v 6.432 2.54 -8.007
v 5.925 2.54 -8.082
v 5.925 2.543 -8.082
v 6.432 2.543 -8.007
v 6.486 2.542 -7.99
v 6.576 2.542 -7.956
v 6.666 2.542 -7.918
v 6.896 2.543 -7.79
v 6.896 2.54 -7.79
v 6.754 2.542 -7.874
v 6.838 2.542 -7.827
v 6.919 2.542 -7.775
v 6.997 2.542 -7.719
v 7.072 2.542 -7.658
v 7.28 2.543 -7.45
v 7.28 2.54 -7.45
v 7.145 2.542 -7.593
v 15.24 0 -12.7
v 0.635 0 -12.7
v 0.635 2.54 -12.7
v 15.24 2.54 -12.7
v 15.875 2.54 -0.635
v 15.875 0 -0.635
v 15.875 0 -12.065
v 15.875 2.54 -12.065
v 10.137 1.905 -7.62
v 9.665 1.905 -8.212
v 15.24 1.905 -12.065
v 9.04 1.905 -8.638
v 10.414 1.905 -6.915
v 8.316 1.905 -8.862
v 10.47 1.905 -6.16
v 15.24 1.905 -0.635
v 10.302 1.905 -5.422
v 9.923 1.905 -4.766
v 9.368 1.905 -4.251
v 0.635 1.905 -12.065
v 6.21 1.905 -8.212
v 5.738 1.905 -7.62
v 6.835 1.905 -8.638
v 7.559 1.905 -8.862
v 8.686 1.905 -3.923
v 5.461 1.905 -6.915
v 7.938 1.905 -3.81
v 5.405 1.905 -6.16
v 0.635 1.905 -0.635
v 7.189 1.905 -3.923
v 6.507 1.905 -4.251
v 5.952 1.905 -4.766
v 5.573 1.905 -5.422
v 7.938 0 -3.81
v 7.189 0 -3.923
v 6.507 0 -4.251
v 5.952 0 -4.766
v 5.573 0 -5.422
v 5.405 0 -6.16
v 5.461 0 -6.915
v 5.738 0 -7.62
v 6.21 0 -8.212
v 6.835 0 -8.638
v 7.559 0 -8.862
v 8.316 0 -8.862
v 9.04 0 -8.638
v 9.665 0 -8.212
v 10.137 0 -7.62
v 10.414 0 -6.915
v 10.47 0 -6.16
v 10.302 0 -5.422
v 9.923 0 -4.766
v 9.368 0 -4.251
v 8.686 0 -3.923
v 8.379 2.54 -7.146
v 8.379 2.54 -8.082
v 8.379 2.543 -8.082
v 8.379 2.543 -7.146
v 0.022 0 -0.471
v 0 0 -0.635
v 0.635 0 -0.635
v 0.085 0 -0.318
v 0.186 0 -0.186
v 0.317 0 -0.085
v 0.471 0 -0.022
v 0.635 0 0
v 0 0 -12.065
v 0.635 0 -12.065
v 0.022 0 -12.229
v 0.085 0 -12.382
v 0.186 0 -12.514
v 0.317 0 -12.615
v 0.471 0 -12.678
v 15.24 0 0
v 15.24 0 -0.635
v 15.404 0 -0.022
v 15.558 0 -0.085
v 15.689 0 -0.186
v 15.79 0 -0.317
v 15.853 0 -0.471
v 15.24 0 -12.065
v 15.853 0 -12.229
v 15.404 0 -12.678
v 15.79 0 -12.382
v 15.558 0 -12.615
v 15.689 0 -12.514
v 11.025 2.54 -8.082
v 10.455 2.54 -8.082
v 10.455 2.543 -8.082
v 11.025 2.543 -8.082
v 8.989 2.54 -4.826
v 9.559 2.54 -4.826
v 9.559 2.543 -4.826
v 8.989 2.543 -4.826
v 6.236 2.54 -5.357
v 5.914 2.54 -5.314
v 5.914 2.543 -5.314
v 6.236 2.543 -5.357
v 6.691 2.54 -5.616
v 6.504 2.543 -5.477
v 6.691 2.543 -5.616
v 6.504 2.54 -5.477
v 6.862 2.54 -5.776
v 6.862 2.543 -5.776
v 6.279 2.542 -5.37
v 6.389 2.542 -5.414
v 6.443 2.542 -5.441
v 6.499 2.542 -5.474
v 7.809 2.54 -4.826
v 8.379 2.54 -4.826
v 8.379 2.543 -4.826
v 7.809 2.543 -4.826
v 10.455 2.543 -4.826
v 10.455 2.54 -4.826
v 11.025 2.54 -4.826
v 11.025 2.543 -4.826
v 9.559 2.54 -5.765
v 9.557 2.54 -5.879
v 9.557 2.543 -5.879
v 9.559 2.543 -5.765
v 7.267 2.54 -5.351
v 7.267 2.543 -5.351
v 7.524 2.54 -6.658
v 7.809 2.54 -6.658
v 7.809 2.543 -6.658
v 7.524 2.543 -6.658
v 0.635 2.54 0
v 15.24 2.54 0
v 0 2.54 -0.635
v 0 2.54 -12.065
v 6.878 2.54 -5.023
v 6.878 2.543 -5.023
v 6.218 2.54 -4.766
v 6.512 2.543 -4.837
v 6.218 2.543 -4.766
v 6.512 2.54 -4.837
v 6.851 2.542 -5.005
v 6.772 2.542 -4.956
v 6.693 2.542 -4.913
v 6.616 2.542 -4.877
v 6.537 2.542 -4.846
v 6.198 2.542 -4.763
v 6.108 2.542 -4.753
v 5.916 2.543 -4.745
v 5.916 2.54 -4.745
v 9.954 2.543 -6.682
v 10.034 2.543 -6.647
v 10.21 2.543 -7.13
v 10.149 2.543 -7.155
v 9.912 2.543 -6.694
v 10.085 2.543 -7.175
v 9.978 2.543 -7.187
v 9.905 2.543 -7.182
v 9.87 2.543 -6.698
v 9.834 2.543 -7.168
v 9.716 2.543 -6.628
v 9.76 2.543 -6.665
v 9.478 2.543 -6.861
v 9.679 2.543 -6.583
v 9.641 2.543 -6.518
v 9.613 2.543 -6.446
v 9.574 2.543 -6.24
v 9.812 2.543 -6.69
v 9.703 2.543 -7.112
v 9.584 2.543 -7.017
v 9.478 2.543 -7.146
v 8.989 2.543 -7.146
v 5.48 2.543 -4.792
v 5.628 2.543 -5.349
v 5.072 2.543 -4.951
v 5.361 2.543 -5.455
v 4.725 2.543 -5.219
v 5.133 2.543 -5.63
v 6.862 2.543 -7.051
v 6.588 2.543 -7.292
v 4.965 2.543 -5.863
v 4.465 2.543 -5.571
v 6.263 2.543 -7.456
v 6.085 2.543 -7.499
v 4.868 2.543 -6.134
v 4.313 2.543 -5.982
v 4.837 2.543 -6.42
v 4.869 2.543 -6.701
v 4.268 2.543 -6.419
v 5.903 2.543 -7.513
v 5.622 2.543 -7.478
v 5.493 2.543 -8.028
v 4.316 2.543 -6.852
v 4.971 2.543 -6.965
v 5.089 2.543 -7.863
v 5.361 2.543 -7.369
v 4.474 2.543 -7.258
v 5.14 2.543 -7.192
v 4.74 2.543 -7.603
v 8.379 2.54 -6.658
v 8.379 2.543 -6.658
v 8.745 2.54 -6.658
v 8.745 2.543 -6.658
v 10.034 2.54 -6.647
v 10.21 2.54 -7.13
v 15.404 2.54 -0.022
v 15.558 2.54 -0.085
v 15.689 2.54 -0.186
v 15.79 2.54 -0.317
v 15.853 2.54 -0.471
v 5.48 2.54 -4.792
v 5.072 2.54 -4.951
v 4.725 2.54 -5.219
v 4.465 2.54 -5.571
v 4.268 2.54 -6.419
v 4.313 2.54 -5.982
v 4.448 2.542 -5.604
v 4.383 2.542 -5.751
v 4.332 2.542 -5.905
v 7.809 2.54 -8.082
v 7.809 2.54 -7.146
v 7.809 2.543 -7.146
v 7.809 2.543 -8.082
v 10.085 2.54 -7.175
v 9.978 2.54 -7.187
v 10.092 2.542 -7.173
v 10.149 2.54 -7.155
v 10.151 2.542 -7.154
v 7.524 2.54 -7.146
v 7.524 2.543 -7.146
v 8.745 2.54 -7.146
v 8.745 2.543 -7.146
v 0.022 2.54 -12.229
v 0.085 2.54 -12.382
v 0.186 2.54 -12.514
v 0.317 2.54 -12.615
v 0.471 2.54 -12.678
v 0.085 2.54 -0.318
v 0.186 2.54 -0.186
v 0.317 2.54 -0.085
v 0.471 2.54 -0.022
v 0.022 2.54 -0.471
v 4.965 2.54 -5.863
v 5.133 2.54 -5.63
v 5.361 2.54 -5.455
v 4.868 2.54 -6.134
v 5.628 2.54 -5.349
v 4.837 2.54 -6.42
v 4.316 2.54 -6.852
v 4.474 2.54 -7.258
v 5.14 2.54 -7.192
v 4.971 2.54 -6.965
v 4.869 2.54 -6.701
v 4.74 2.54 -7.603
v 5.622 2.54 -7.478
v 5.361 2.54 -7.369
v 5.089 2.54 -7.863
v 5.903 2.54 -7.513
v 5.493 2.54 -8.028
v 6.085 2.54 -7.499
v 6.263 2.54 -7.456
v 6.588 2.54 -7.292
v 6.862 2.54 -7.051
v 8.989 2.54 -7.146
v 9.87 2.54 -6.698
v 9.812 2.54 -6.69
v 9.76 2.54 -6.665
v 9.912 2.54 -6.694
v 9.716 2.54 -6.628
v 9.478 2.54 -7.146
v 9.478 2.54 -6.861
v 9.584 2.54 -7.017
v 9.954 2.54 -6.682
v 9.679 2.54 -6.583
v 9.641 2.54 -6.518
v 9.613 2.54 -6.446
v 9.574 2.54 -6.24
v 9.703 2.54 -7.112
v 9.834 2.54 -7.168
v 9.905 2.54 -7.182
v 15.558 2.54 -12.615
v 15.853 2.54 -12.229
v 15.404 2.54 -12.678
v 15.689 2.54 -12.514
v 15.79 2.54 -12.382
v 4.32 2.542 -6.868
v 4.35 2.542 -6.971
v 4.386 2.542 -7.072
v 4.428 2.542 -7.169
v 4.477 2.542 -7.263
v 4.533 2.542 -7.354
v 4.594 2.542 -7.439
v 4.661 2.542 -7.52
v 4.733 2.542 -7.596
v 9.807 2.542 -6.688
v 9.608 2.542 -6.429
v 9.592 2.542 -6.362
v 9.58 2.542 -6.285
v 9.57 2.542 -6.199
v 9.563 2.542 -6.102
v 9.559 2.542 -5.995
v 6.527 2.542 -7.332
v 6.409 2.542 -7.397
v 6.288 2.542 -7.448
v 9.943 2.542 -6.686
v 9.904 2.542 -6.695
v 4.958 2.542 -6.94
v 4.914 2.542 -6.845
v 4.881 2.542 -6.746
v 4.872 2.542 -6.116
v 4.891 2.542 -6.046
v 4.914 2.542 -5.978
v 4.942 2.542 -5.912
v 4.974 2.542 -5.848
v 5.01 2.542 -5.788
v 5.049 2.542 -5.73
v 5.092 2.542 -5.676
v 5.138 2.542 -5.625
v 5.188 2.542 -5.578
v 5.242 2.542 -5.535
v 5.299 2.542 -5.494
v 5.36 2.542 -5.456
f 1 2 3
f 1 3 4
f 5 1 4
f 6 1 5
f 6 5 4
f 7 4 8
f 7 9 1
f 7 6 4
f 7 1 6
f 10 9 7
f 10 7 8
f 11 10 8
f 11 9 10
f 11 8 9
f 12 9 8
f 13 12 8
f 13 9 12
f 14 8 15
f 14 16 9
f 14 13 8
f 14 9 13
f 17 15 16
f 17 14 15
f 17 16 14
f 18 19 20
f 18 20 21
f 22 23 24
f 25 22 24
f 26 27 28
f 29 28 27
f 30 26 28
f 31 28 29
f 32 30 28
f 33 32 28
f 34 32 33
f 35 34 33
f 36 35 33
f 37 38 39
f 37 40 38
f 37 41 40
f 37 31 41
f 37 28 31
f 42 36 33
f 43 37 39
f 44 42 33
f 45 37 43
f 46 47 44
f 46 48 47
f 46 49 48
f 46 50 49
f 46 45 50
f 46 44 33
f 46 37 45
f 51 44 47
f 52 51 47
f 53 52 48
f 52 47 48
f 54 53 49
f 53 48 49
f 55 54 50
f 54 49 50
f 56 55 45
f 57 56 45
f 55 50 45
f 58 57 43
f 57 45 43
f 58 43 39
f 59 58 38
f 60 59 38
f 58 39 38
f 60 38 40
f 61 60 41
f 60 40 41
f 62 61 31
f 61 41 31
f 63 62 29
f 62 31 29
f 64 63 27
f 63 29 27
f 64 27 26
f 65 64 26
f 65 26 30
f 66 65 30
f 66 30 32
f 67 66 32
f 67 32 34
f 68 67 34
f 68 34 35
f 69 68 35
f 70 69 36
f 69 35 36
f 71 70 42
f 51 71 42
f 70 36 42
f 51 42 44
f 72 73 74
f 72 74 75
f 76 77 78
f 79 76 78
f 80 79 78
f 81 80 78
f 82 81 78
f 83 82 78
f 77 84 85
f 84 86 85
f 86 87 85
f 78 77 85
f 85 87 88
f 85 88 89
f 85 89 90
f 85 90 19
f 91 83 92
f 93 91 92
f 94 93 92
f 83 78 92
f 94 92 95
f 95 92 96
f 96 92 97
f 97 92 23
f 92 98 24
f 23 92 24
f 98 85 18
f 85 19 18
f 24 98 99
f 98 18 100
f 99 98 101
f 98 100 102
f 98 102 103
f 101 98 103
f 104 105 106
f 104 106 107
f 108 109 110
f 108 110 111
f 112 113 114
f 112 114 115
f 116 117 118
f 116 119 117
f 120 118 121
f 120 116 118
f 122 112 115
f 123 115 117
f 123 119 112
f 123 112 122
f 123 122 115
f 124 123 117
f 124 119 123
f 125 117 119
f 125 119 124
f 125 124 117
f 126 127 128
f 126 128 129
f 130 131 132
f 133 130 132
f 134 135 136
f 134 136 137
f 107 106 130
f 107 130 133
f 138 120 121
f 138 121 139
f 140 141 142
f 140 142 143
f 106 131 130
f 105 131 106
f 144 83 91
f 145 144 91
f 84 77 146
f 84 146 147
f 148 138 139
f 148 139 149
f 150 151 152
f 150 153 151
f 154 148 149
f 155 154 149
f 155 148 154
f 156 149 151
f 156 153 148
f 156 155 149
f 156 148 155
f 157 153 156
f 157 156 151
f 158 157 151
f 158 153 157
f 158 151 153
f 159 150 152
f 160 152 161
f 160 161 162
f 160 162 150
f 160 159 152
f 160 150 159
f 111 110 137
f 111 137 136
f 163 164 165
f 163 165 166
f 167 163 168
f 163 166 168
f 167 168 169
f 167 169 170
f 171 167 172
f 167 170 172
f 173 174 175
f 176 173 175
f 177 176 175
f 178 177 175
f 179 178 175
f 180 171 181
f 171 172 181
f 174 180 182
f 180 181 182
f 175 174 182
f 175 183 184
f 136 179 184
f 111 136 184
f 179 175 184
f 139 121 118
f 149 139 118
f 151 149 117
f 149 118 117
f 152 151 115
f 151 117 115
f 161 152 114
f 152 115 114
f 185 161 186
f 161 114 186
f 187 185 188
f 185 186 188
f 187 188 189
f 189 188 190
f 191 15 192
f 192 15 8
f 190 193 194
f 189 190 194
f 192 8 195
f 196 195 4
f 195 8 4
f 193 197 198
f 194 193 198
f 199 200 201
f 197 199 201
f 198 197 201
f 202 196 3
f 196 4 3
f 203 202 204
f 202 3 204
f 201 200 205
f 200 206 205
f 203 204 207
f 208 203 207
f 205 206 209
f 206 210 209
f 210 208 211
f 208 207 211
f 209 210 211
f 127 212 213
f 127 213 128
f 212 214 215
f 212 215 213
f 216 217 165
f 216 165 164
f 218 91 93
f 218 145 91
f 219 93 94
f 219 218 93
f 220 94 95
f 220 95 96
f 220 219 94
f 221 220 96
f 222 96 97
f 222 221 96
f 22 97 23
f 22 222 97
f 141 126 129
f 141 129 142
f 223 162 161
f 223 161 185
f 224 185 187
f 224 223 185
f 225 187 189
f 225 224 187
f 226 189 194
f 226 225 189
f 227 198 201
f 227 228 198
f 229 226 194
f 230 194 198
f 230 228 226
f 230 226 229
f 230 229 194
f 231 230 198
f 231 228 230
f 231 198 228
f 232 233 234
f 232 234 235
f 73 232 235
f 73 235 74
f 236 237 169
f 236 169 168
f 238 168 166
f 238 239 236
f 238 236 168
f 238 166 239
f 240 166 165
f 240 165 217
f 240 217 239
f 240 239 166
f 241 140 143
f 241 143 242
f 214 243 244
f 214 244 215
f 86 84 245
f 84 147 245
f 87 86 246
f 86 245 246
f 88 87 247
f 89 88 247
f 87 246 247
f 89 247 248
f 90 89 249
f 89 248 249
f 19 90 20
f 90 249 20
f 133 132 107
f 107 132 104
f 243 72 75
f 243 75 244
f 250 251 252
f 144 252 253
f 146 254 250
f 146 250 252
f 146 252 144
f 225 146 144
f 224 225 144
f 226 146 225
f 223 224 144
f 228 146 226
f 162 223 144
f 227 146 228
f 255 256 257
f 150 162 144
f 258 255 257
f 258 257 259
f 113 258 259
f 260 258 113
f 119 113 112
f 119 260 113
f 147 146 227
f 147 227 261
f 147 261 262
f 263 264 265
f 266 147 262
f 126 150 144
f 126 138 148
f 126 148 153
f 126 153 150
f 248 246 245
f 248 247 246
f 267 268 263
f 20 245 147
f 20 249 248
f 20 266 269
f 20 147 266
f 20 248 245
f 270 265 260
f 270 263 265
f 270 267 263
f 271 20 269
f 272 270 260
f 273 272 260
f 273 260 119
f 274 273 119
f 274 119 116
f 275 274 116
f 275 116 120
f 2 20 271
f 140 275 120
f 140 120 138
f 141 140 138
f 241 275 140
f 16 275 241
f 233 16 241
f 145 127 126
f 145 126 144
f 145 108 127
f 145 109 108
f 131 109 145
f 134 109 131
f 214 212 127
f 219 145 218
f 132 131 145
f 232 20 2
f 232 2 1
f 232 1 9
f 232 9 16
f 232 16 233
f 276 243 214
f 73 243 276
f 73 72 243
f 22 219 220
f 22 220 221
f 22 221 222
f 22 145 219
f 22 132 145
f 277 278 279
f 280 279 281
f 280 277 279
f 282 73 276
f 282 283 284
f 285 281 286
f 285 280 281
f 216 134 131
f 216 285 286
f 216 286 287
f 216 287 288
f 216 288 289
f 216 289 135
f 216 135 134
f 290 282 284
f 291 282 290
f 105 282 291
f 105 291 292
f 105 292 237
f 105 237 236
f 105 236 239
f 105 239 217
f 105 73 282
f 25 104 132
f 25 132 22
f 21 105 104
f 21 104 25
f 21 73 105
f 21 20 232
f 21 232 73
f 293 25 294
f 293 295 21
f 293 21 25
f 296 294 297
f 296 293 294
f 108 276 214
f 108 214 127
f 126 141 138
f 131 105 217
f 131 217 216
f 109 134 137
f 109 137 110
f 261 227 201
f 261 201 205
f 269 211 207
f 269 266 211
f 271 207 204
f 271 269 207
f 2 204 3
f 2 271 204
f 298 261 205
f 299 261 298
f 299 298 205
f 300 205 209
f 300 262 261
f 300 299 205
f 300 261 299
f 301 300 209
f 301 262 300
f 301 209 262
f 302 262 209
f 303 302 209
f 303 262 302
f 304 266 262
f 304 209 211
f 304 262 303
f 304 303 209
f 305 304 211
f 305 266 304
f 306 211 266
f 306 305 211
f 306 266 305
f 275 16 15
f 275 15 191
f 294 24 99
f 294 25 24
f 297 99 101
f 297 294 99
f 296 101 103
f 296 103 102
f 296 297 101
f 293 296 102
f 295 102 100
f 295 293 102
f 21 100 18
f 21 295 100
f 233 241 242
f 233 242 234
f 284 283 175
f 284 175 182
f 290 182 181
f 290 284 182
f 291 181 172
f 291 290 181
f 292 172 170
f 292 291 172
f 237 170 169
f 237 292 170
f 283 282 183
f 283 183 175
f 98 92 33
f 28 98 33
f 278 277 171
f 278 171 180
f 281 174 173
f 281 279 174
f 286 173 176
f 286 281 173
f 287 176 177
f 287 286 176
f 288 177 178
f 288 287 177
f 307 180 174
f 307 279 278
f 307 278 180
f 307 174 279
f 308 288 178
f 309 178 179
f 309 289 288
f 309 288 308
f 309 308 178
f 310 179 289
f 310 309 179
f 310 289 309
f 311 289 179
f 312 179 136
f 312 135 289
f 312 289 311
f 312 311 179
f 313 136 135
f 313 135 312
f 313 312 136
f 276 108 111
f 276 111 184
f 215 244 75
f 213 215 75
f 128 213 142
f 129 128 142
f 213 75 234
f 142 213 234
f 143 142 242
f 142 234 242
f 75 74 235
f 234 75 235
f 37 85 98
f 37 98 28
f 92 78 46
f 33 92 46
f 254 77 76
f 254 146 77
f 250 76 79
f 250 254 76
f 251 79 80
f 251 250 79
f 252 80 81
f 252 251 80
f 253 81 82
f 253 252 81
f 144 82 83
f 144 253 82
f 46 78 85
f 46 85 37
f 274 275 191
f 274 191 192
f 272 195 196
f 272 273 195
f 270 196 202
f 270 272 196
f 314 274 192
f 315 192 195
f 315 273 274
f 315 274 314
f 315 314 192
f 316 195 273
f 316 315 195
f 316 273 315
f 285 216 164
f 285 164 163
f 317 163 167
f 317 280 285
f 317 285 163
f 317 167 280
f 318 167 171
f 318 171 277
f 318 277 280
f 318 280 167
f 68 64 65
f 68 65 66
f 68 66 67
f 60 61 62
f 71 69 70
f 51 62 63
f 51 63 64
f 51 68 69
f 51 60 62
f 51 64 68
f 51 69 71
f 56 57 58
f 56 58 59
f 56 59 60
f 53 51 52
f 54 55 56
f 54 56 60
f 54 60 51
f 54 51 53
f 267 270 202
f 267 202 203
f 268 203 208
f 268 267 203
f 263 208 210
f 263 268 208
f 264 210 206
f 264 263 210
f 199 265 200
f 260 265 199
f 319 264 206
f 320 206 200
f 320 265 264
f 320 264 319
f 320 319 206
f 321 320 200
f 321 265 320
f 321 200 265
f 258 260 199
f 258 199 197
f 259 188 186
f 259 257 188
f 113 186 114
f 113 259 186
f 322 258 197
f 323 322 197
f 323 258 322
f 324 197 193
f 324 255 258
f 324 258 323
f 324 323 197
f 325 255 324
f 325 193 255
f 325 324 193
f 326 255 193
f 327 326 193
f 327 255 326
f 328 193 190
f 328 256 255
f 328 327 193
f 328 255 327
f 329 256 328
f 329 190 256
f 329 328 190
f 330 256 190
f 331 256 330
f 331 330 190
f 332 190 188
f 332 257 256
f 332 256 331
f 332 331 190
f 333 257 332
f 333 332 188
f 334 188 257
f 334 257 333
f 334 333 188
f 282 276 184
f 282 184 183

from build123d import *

# Parameters (mm, degrees)
SKETCH1_W           = 15.875
SKETCH1_H           = 12.7
BOSS_EXTRUDE1_DEPTH = 2.54
FILLET1_R           = 0.635
SHELL1_START        = 0.635
SHELL1_OUTLINE_W    = 1.905
SHELL1_OUTLINE_H    = 11.43
SHELL1_DEPTH        = 14.605
SKETCH2_R           = 2.54
BOSS_EXTRUDE2_DEPTH = 1.905
SKETCH3_W           = 0.569871795
SKETCH3_H           = 3.256410256
BOSS_EXTRUDE3_DEPTH = 0.00254


# Read off the part's stored shape, not the designer's step: Shell1
with BuildPart() as part:
    # Sketch1 → Boss-Extrude1 (new body)
    with BuildSketch(Plane(origin=(0, 0, 0), x_dir=(1, 0, 0), z_dir=(0, 1, 0))):
        with Locations((7.9375, 6.35)):
            Rectangle(SKETCH1_W, SKETCH1_H)
    extrude(amount=BOSS_EXTRUDE1_DEPTH)

    # Fillet1
    fillet1_edges = [part.edges().sort_by_distance(p)[0] for p in [
        (0, 1.27, -12.7),
        (15.875, 1.27, -12.7),
        (15.875, 1.27, 0),
        (0, 1.27, 0),
    ]]
    fillet(fillet1_edges, radius=FILLET1_R)

    # Shell1 outline → Shell1 (cut)
    with BuildSketch(Plane.YZ.offset(SHELL1_START)):
        with Locations((0.9525, -6.35)):
            Rectangle(SHELL1_OUTLINE_W, SHELL1_OUTLINE_H)
    extrude(amount=SHELL1_DEPTH, mode=Mode.SUBTRACT)

    # Sketch2 → Boss-Extrude2 (add)
    with BuildSketch(Plane(origin=(0, 1.905, 0), x_dir=(-1, 0, 0), z_dir=(0, -1, 0))):
        with Locations(Location((-7.9375, 6.35, 0), (0, 0, 270))):
            Circle(SKETCH2_R)
    extrude(amount=BOSS_EXTRUDE2_DEPTH)

    # Sketch3 → Boss-Extrude3 (add)
    with BuildSketch(Plane(origin=(0, 2.54, 0), x_dir=(1, 0, 0), z_dir=(0, 1, 0))):
        with BuildLine():
            Line((7.279705128, 7.450208734), (6.861841546, 7.050789663))
            add(Edge.make_bspline(
                [(6.861841546, 7.050789663), (6.826394953, 7.0874415), (6.757156652, 7.15903402), (6.645587691, 7.253816208), (6.529560035, 7.332804336), (6.411330769, 7.399327635), (6.288773291, 7.449657252), (6.163304701, 7.486333291), (6.034123843, 7.508693286), (5.946699207, 7.511251666), (5.902726963, 7.512538462)],
                knots=[0, 0, 0, 0, 1.115251505, 2.178435587, 3.19620269, 4.182487026, 5.141301733, 6.088180966, 7.038406374, 8, 8, 8, 8], degree=3))
            add(Edge.make_bspline(
                [(5.902726963, 7.512538462), (5.866004796, 7.511521848), (5.793537645, 7.509515672), (5.687136877, 7.494808428), (5.585359044, 7.469798119), (5.487855743, 7.435329281), (5.394913883, 7.390728433), (5.3063386, 7.336030097), (5.222348271, 7.271728275), (5.144052361, 7.198155668), (5.072430014, 7.117772066), (5.00914711, 7.032002955), (4.956137527, 6.941044826), (4.912633425, 6.845818837), (4.87874541, 6.745884235), (4.854545111, 6.6413083), (4.840548304, 6.531966489), (4.838459187, 6.457636741), (4.837397436, 6.419860176)],
                knots=[0, 0, 0, 0, 1.035432265, 2.043311493, 3.022114605, 3.98653278, 4.95457646, 5.923598177, 6.917315552, 7.932509744, 8.948865224, 9.949768934, 10.933144597, 11.912367597, 12.897413939, 13.903909035, 14.934704909, 16, 16, 16, 16], degree=3))
            add(Edge.make_bspline(
                [(4.837397436, 6.419860176), (4.83770342, 6.39334594), (4.838306522, 6.341085836), (4.844908537, 6.263778637), (4.855539337, 6.188772378), (4.870924739, 6.116180674), (4.890164335, 6.045940615), (4.912736762, 5.977446244), (4.941053539, 5.911643999), (4.97248559, 5.847769629), (5.009040702, 5.787566028), (5.048453857, 5.730156898), (5.091190988, 5.675823652), (5.137528908, 5.624788408), (5.188119763, 5.577848731), (5.241655968, 5.533593089), (5.299040605, 5.493129351), (5.359081648, 5.455442035), (5.422297778, 5.422702743), (5.486973793, 5.39304727), (5.554090313, 5.368962616), (5.622830153, 5.349548188), (5.692947662, 5.333039117), (5.765128654, 5.322873974), (5.83874741, 5.315176031), (5.888501332, 5.314700728), (5.913539263, 5.314461538)],
                knots=[0, 0, 0, 0, 1.103660481, 2.175337485, 3.227646561, 4.255952547, 5.262355991, 6.258840057, 7.255597736, 8.242457506, 9.22035537, 10.185017736, 11.140346927, 12.096287581, 13.051739095, 14.01125915, 14.986044842, 15.97314143, 16.960198552, 17.947847494, 18.933482797, 19.925264591, 20.920966487, 21.929612487, 22.958107872, 24, 24, 24, 24], degree=3))
            add(Edge.make_bspline(
                [(5.913539263, 5.314461538), (5.956007897, 5.315689957), (6.039447719, 5.318103479), (6.161907656, 5.336976883), (6.278599775, 5.368022564), (6.37183622, 5.40468571), (6.444884512, 5.440891042), (6.500495097, 5.474379191), (6.558000776, 5.511839363), (6.616446429, 5.554685345), (6.676489454, 5.602402968), (6.737069952, 5.656037337), (6.799738796, 5.713822348), (6.840792535, 5.755064647), (6.861841546, 5.776210337)],
                knots=[0, 0, 0, 0, 1.404581149, 2.759636711, 4.088442092, 5.392261763, 6.066678138, 6.783632037, 7.538459478, 8.336747902, 9.180226004, 10.074962426, 11.012997595, 12, 12, 12, 12], degree=3))
            Line((6.861841546, 5.776210337), (7.266984776, 5.350714543))
            add(Edge.make_bspline(
                [(7.266984776, 5.350714543), (7.238505387, 5.323218588), (7.182919712, 5.269552363), (7.099070264, 5.193351332), (7.015326343, 5.124876235), (6.933711029, 5.061641725), (6.852887378, 5.005489979), (6.77286396, 4.956364915), (6.694546676, 4.91302409), (6.616309243, 4.876198427), (6.537664826, 4.844929614), (6.456748963, 4.818009219), (6.373314287, 4.795235533), (6.286851216, 4.776860159), (6.198166225, 4.76212559), (6.106429341, 4.752179841), (6.012222221, 4.745493645), (5.948320072, 4.744892834), (5.916083333, 4.744589744)],
                knots=[0, 0, 0, 0, 1.244526981, 2.429050516, 3.560637417, 4.644440555, 5.67424972, 6.652764056, 7.595344123, 8.486817594, 9.369275933, 10.254498637, 11.166417451, 12.086725134, 13.032340136, 13.991389299, 14.986715468, 16, 16, 16, 16], degree=3))
            add(Edge.make_bspline(
                [(5.916083333, 4.744589744), (5.856868437, 4.746099249), (5.741001344, 4.749052933), (5.57120114, 4.770937726), (5.409895505, 4.807627196), (5.256692012, 4.859516227), (5.111639375, 4.925802032), (4.974774704, 5.007065316), (4.846318595, 5.103090176), (4.727308719, 5.212751107), (4.619658622, 5.333862399), (4.524508403, 5.463902701), (4.445800139, 5.603511114), (4.380446971, 5.750625175), (4.329341653, 5.905916222), (4.293372173, 6.069552234), (4.271190057, 6.24137521), (4.268763302, 6.358734263), (4.267525641, 6.418588141)],
                knots=[0, 0, 0, 0, 1.078019885, 2.10938526, 3.111377082, 4.085535484, 5.04941344, 6.010039228, 6.978205633, 7.964457913, 8.951525778, 9.924444315, 10.892603023, 11.863865945, 12.85144698, 13.863884204, 14.910567087, 16, 16, 16, 16], degree=3))
            add(Edge.make_bspline(
                [(4.267525641, 6.418588141), (4.268048616, 6.45762433), (4.269085026, 6.534984515), (4.279977786, 6.648942336), (4.295162928, 6.760030827), (4.319252774, 6.867096523), (4.348290707, 6.971581794), (4.384403193, 7.072351009), (4.427532553, 7.169693788), (4.476288628, 7.263773089), (4.531445888, 7.353972592), (4.593062603, 7.43951734), (4.659552517, 7.521067724), (4.732513276, 7.597541827), (4.810884664, 7.669611105), (4.895020519, 7.736885002), (4.984414805, 7.800328301), (5.07930948, 7.858304953), (5.177860994, 7.910747916), (5.278826351, 7.95700485), (5.381957492, 7.995664994), (5.486818369, 8.027732158), (5.593852019, 8.051668028), (5.702294461, 8.06978671), (5.813068412, 8.079915169), (5.887443523, 8.081573262), (5.92498758, 8.082410256)],
                knots=[0, 0, 0, 0, 1.071919942, 2.124283339, 3.142214191, 4.149696895, 5.136002878, 6.119640489, 7.086990633, 8.058538607, 9.028339693, 9.988281803, 10.952401235, 11.916291999, 12.888973767, 13.874849856, 14.873389453, 15.898127285, 16.927174885, 17.938320013, 18.946391617, 19.950418109, 20.947802303, 21.956882652, 22.968648068, 24, 24, 24, 24], degree=3))
            add(Edge.make_bspline(
                [(5.92498758, 8.082410256), (5.95701651, 8.08193047), (6.020741359, 8.080975887), (6.115638353, 8.073018393), (6.209776405, 8.060521229), (6.302818472, 8.041665671), (6.395430086, 8.01928174), (6.486394226, 7.98997307), (6.577145903, 7.957303034), (6.666261809, 7.918252678), (6.753866337, 7.875625686), (6.837907215, 7.827263816), (6.91979548, 7.776143202), (6.997716537, 7.719238304), (7.073130016, 7.658613168), (7.145641572, 7.593984943), (7.214614876, 7.524276087), (7.257898691, 7.475022665), (7.279705128, 7.450208734)],
                knots=[0, 0, 0, 0, 0.996412454, 1.982464992, 2.961075852, 3.949442424, 4.934965278, 5.923860011, 6.921385422, 7.934793307, 8.949617135, 9.951082467, 10.950285876, 11.951772932, 12.951063433, 13.960125323, 14.972308753, 16, 16, 16, 16], degree=3))
        make_face()
        Polygon((7.808871795, 8.082410256), (8.37874359, 8.082410256), (8.37874359, 7.146192308), (8.745089744, 7.146192308), (8.745089744, 6.657730769), (8.37874359, 6.657730769), (8.37874359, 4.826), (7.808871795, 4.826), (7.808871795, 6.657730769), (7.523935897, 6.657730769), (7.523935897, 7.146192308), (7.808871795, 7.146192308), align=None)
        with BuildLine():
            Line((8.989320513, 7.146192308), (9.477782051, 7.146192308))
            Line((9.477782051, 7.146192308), (9.477782051, 6.860620393))
            add(Edge.make_bspline(
                [(9.477782051, 6.860620393), (9.49159969, 6.885999247), (9.51860684, 6.935603272), (9.568221237, 7.002186851), (9.625220267, 7.058261684), (9.687555778, 7.105000626), (9.755416695, 7.141429043), (9.826985825, 7.167388882), (9.901650896, 7.18425918), (9.952584876, 7.186011685), (9.978327925, 7.186897436)],
                knots=[0, 0, 0, 0, 1.09866127, 2.147379032, 3.14564304, 4.131443017, 5.102343063, 6.064490016, 7.021754664, 8, 8, 8, 8], degree=3))
            add(Edge.make_bspline(
                [(9.978327925, 7.186897436), (9.99702059, 7.186022129), (10.035085533, 7.184239691), (10.093101861, 7.173878355), (10.151955263, 7.155143087), (10.190685873, 7.138274469), (10.210474359, 7.129655849)],
                knots=[0, 0, 0, 0, 0.931404136, 1.896671404, 2.925354185, 4, 4, 4, 4], degree=3))
            Line((10.210474359, 7.129655849), (10.033661458, 6.64691847))
            add(Edge.make_bspline(
                [(10.033661458, 6.64691847), (10.01785691, 6.654554463), (9.988150443, 6.668907192), (9.945021811, 6.68584489), (9.905880789, 6.696179446), (9.8810661, 6.697721452), (9.86956891, 6.698435897)],
                knots=[0, 0, 0, 0, 1.214386998, 2.282580073, 3.20428172, 4, 4, 4, 4], degree=3))
            add(Edge.make_bspline(
                [(9.86956891, 6.698435897), (9.858713328, 6.697962468), (9.837358527, 6.697031151), (9.805839437, 6.689050083), (9.776155019, 6.675286977), (9.746874781, 6.657655073), (9.720308609, 6.633145407), (9.693758846, 6.604771118), (9.670361774, 6.569739283), (9.645671077, 6.530747072), (9.624647831, 6.483020641), (9.606621046, 6.426045117), (9.590559035, 6.359161255), (9.579506178, 6.282013934), (9.568823149, 6.195349687), (9.562464348, 6.098532411), (9.557725052, 5.991868249), (9.557435276, 5.917412815), (9.557284255, 5.878609175)],
                knots=[0, 0, 0, 0, 0.544232178, 1.070598461, 1.618251235, 2.182094276, 2.777567932, 3.425210017, 4.127676488, 4.886675562, 5.738955394, 6.734782583, 7.883056018, 9.186093582, 10.642914445, 12.264202625, 14.053029461, 16, 16, 16, 16], degree=3))
            Line((9.557284255, 5.878609175), (9.559192308, 5.765398037))
            Line((9.559192308, 5.765398037), (9.559192308, 4.826))
            Line((9.559192308, 4.826), (8.989320513, 4.826))
            Line((8.989320513, 4.826), (8.989320513, 7.146192308))
        make_face()
        with Locations((10.739641026, 6.454205128)):
            Rectangle(SKETCH3_W, SKETCH3_H)
    extrude(amount=BOSS_EXTRUDE3_DEPTH)


solid = part.part
